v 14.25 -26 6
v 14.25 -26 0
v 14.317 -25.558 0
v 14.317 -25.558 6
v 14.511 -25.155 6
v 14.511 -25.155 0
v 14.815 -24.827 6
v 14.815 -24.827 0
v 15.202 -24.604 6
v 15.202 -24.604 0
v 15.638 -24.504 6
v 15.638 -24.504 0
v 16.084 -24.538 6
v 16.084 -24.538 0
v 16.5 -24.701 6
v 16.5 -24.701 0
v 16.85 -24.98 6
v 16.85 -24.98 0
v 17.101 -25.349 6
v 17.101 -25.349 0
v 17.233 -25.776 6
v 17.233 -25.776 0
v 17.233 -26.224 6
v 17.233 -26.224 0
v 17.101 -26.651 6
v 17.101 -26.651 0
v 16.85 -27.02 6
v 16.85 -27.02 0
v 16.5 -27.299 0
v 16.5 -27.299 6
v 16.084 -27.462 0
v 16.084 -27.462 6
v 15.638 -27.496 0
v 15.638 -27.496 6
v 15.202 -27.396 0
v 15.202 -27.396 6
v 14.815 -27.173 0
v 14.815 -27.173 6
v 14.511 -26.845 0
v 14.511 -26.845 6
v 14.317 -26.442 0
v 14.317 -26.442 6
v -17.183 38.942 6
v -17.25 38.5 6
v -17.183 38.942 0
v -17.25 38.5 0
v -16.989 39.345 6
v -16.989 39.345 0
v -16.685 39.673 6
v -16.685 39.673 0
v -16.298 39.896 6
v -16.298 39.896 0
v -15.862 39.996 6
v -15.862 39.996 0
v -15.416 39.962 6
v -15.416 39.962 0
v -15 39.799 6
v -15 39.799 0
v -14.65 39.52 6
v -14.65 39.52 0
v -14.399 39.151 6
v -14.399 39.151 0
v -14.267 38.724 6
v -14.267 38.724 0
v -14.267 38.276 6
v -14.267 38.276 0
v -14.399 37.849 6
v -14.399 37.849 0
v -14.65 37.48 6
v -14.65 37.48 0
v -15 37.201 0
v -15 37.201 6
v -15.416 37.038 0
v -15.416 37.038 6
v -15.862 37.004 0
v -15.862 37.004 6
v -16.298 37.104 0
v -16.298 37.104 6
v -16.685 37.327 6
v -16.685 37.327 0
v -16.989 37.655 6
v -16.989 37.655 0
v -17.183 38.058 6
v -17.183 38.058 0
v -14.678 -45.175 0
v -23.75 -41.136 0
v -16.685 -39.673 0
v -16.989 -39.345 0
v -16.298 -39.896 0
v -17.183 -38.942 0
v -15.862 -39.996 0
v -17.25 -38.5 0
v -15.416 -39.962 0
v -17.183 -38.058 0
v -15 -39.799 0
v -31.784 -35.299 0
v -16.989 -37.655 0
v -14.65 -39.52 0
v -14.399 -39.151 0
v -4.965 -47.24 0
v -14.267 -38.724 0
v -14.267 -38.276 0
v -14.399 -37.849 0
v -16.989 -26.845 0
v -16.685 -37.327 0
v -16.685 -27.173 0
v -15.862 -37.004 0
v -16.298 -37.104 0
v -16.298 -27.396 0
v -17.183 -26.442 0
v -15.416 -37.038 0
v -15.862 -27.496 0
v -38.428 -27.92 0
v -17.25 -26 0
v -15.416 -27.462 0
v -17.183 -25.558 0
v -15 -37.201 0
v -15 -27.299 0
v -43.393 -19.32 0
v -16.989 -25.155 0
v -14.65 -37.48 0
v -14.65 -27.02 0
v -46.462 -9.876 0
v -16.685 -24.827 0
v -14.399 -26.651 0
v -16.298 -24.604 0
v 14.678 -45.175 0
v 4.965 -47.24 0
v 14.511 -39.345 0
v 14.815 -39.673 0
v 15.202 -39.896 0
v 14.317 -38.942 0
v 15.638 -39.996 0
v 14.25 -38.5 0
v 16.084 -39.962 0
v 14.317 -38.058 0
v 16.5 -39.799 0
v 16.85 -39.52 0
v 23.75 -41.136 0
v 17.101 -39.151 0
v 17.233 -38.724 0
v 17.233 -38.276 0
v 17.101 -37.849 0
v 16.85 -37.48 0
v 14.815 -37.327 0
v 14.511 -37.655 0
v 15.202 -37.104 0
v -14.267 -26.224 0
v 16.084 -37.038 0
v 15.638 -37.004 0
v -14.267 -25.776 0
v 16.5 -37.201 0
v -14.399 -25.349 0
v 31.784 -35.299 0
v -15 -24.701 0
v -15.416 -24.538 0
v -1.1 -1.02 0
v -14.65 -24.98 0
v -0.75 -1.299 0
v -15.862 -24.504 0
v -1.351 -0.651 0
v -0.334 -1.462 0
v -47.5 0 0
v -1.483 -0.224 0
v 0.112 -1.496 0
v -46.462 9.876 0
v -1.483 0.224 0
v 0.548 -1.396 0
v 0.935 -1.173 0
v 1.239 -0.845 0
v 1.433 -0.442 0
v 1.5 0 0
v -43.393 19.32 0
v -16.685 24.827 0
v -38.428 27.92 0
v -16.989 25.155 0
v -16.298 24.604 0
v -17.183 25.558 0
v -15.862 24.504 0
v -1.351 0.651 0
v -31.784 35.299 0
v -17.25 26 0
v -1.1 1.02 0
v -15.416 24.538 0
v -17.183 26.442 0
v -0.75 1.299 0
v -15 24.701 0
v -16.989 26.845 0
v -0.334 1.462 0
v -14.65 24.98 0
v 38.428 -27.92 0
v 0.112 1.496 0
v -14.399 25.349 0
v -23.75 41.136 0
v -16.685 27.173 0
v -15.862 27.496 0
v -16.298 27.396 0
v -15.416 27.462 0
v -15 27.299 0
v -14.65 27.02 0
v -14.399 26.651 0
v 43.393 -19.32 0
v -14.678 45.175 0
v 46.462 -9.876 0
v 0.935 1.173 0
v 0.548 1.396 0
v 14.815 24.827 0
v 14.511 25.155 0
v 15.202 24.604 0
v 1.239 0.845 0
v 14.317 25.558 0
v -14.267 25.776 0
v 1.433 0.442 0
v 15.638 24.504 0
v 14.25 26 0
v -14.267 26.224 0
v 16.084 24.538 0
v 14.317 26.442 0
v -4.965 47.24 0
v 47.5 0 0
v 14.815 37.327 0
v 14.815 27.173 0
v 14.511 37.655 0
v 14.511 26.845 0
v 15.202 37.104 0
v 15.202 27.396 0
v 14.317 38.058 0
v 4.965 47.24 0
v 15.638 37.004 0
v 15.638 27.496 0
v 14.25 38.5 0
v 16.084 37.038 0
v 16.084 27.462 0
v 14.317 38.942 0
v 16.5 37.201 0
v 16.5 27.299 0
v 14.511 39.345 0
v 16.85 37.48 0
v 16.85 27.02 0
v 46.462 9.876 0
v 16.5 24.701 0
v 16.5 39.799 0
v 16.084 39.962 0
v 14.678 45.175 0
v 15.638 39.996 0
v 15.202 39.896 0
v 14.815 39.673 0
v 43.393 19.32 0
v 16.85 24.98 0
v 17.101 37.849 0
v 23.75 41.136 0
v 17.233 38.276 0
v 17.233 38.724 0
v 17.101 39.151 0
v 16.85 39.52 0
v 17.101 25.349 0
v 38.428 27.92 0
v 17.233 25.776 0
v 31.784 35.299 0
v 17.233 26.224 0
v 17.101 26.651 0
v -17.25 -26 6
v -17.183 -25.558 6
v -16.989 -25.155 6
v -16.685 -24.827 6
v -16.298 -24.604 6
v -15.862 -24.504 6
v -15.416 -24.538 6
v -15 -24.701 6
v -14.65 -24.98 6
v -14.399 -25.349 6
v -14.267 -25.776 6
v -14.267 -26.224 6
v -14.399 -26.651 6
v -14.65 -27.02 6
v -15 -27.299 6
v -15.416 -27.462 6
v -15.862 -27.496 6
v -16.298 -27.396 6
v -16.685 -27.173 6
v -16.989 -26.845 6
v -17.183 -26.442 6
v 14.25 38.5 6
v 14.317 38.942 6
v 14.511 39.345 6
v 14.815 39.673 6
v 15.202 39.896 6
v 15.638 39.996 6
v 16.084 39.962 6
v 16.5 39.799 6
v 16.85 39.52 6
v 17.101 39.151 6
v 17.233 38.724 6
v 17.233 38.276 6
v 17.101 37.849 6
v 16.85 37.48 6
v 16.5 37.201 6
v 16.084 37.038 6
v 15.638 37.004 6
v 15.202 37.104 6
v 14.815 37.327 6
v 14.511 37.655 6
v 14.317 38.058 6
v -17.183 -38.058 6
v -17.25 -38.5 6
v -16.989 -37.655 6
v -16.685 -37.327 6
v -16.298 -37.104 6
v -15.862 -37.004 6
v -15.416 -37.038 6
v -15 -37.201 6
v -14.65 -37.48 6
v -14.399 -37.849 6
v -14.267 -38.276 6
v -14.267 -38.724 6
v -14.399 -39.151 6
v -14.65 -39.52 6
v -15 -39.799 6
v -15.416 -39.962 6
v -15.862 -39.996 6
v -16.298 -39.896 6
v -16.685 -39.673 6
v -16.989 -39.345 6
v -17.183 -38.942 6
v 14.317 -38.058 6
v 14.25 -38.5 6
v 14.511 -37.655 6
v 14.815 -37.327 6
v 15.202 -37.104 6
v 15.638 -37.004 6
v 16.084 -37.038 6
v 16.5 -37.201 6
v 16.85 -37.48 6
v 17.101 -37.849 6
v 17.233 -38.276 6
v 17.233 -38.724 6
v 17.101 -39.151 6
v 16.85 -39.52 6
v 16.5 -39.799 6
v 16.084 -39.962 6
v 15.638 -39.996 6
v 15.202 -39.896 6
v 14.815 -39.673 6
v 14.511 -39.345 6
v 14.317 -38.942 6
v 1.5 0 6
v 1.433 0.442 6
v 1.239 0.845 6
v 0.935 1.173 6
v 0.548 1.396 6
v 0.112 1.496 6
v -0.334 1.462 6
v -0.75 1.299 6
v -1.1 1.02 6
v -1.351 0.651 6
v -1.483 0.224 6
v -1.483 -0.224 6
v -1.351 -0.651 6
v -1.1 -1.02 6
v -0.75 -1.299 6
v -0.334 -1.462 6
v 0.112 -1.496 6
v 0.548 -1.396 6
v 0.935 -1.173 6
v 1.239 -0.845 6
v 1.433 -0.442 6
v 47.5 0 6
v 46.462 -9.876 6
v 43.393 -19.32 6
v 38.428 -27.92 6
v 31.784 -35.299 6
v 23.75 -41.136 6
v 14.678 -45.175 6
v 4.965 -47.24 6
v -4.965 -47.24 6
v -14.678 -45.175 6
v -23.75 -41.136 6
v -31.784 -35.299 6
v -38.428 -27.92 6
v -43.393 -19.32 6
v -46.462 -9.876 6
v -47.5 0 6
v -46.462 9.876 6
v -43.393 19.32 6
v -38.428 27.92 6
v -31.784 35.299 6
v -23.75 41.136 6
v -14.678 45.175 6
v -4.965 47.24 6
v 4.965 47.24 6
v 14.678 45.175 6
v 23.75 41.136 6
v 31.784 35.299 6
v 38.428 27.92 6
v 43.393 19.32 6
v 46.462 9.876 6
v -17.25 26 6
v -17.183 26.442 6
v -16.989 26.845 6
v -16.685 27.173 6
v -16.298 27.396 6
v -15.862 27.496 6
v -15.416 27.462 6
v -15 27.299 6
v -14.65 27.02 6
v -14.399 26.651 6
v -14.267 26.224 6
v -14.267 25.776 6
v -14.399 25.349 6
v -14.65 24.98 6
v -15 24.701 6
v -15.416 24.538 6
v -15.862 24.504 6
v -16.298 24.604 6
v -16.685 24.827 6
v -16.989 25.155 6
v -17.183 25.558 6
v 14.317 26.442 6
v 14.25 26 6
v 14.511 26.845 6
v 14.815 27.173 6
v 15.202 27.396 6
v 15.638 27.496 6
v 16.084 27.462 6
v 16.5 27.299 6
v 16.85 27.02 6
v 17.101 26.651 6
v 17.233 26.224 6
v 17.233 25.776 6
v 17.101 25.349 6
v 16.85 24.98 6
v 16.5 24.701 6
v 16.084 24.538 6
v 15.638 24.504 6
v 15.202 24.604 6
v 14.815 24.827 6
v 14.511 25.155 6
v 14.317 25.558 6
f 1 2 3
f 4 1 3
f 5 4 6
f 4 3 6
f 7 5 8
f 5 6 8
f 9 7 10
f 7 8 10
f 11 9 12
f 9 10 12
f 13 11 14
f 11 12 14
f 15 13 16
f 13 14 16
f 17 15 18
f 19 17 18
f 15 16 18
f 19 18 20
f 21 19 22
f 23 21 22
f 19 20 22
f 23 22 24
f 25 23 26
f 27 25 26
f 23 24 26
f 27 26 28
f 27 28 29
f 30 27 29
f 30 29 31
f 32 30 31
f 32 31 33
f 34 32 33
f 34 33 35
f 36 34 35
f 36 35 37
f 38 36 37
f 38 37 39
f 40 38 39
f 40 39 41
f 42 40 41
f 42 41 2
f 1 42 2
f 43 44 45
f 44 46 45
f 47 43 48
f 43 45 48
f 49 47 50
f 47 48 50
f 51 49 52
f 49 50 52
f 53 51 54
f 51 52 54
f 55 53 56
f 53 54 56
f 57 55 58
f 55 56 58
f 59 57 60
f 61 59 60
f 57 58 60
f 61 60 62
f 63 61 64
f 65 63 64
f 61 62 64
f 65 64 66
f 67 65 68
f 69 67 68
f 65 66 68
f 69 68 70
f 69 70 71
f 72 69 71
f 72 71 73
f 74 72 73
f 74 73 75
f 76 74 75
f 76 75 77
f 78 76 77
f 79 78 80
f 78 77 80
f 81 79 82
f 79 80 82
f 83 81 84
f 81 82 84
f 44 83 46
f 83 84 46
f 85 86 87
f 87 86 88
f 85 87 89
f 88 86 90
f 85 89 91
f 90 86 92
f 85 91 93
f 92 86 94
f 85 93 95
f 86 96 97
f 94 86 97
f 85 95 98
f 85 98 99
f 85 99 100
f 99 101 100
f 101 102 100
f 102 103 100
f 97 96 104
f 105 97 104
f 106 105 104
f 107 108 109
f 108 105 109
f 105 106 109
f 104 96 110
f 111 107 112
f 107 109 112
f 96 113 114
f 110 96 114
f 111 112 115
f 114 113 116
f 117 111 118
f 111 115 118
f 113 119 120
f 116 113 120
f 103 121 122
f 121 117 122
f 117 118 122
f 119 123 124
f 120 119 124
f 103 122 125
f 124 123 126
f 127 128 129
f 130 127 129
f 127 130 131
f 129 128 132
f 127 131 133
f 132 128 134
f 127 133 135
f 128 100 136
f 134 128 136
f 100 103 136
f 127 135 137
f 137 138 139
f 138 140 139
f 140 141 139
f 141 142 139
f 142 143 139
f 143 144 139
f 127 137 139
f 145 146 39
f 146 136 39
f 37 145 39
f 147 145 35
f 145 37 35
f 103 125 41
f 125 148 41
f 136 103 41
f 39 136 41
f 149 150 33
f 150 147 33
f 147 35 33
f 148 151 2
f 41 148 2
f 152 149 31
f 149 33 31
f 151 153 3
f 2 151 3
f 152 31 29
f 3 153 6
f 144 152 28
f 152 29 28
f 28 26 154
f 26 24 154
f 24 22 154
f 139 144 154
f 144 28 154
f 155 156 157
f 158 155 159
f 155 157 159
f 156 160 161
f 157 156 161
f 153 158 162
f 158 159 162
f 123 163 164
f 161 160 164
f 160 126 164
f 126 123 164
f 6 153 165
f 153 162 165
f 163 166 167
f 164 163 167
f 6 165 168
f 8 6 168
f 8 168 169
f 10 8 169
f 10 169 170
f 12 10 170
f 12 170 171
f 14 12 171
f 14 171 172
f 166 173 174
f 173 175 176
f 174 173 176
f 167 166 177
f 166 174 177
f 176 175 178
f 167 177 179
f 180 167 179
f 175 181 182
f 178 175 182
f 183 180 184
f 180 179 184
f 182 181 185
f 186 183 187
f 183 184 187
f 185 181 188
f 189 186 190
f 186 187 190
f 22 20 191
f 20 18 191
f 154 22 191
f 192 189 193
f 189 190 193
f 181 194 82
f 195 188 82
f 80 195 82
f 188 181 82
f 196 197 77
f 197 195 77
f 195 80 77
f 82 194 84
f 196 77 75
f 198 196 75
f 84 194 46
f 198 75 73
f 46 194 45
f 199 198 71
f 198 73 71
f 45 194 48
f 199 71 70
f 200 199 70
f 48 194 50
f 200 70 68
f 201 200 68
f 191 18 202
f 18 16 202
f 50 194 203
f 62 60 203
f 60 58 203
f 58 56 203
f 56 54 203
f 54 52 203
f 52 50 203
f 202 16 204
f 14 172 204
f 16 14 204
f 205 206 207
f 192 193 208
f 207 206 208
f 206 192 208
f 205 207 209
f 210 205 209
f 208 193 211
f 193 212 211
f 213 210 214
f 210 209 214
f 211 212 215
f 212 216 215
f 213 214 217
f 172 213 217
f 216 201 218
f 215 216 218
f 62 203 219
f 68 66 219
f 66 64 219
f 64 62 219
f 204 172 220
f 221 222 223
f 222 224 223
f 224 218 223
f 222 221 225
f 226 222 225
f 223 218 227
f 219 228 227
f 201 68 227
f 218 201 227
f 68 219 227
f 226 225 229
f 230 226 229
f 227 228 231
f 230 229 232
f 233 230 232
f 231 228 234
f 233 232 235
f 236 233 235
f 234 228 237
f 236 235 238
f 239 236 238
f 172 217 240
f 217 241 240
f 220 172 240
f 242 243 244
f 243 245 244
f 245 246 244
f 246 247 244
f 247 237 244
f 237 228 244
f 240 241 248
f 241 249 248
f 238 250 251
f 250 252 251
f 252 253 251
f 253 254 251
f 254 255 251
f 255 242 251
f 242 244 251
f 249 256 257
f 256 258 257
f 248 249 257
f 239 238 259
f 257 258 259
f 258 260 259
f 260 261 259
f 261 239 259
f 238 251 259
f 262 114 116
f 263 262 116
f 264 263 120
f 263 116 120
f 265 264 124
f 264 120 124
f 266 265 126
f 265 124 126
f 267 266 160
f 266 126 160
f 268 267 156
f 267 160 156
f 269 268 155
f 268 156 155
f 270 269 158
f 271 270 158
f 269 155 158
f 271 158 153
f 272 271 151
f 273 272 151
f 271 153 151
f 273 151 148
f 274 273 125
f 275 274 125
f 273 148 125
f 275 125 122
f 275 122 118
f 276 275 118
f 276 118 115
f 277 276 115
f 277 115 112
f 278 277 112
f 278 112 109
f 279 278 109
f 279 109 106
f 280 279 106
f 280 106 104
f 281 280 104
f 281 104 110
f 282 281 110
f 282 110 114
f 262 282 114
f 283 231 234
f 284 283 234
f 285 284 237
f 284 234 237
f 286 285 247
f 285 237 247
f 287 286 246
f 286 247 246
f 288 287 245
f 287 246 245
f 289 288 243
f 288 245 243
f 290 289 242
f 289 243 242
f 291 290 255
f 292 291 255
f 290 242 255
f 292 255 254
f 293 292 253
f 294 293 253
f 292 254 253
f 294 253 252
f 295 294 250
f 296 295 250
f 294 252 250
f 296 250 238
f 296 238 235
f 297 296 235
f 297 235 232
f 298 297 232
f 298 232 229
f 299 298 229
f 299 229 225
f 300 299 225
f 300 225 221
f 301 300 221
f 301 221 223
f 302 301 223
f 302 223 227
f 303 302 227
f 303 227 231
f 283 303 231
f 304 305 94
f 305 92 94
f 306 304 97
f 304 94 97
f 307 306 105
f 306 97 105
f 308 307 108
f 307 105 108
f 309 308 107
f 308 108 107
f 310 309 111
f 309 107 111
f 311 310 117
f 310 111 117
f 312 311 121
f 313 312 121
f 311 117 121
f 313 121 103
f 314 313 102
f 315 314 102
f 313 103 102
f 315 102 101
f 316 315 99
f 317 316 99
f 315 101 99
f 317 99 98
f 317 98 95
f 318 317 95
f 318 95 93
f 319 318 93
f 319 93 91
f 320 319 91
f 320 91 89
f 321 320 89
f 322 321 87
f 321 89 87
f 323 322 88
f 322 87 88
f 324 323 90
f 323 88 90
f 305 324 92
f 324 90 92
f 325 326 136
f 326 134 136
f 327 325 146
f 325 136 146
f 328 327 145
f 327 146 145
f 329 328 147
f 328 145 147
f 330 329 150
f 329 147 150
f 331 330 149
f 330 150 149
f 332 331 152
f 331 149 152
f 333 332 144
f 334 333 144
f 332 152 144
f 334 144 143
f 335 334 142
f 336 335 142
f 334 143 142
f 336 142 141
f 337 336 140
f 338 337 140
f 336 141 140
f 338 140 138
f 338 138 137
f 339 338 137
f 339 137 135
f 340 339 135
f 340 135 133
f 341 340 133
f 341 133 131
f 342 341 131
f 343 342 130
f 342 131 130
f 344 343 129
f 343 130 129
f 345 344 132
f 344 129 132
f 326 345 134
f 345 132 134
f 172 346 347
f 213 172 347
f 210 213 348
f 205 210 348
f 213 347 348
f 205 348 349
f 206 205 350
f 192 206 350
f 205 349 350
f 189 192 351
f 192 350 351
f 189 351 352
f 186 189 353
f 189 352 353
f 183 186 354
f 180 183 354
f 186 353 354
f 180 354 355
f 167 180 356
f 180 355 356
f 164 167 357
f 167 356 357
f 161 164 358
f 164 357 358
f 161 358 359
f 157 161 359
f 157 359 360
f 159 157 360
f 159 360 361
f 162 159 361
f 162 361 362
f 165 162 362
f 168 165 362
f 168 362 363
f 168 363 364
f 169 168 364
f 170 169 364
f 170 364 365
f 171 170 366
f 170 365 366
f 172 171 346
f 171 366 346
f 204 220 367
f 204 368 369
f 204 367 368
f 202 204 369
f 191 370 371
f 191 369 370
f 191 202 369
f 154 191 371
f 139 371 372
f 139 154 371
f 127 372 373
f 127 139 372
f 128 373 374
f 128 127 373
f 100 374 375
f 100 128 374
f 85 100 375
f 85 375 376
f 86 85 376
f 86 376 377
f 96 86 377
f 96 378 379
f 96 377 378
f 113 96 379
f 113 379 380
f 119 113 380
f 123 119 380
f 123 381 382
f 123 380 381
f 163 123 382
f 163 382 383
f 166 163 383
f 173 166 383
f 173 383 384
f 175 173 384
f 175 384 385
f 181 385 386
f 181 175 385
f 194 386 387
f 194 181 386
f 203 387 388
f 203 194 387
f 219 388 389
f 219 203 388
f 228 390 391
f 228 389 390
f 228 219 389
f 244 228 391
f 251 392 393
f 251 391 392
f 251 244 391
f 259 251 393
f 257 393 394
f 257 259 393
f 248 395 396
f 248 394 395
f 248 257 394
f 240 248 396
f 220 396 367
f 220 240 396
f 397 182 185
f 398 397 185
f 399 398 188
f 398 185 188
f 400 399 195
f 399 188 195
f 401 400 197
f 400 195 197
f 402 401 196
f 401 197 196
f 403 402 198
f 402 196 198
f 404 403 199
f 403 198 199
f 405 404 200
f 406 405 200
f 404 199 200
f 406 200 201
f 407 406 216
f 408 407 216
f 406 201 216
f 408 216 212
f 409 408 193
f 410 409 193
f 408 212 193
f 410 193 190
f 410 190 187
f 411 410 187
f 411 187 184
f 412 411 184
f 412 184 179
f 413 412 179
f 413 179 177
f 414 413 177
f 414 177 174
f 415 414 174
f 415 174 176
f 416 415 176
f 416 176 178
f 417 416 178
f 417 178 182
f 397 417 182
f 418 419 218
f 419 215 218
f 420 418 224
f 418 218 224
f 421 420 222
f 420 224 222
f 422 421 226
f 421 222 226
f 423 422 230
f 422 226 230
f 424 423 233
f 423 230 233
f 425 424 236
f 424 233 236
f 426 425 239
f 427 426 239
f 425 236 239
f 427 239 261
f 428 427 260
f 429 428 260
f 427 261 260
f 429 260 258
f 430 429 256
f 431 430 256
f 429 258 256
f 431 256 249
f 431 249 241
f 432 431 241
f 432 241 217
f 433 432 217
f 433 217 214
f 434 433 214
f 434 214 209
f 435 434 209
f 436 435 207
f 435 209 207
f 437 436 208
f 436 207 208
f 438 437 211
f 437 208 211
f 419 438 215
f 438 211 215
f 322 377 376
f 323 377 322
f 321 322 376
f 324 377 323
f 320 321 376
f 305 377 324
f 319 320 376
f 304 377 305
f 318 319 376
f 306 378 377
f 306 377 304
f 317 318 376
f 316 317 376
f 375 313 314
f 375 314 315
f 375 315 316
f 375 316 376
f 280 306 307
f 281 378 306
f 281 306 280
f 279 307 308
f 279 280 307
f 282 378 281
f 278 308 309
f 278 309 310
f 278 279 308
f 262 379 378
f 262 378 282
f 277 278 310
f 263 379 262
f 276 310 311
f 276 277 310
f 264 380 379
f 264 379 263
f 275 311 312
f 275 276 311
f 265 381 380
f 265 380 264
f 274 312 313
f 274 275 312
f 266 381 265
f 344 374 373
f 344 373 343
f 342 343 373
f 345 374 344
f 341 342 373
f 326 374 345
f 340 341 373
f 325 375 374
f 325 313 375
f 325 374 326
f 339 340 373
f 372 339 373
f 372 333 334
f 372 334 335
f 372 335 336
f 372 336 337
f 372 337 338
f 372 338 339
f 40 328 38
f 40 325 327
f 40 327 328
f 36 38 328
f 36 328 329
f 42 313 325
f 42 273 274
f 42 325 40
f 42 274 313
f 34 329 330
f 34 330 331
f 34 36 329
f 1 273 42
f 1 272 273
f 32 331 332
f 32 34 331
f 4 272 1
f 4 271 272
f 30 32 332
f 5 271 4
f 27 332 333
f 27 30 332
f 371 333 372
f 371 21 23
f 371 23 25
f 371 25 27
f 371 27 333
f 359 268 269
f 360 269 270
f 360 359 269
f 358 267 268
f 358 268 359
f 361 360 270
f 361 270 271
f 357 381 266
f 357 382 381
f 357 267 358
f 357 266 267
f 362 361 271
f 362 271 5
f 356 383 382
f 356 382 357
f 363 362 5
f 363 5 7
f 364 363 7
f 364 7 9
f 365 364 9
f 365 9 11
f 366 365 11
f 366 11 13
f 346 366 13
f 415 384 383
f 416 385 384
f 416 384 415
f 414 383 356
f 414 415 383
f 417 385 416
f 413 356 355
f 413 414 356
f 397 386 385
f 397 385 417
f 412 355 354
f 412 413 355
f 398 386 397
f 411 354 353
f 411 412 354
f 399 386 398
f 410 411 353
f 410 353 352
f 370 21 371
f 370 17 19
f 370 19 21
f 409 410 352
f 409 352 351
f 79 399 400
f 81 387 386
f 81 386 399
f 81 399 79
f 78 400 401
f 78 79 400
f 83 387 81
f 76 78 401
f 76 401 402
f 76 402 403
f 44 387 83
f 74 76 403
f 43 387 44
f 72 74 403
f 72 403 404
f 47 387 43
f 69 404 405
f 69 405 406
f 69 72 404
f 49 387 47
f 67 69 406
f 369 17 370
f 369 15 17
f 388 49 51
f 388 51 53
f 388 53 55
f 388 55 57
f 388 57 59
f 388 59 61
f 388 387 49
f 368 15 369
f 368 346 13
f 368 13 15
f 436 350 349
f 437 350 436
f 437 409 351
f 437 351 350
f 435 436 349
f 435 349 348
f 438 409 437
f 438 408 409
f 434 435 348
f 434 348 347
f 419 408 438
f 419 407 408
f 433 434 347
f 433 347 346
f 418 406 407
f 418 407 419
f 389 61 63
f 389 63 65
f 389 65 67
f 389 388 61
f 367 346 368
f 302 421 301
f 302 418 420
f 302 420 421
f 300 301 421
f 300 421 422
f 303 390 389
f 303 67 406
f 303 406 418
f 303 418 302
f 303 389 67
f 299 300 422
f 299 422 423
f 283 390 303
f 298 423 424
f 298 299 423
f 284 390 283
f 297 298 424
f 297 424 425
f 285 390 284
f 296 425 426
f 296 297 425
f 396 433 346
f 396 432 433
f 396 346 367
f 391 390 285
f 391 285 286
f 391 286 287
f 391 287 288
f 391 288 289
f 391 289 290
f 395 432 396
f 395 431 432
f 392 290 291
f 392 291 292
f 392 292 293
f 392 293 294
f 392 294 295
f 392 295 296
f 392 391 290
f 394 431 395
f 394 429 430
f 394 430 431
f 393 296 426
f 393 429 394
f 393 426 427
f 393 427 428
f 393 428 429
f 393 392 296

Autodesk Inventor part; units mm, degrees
ref_plane "YZ Plane" through (0, 0, 0) normal (1, 0, 0) x (0, 1, 0)
ref_plane "XZ Plane" through (0, 0, 0) normal (0, 1, 0) x (-1, 0, 0)
ref_plane "XY Plane" through (0, 0, 0) normal (0, 0, 1) x (1, 0, 0)
sketch "Sketch1" plane through (0, 0, 0) normal (0, 0, 1) x (1, 0, 0)
  circle A0 centre (0, 0) radius 47.5
  dimension "d0" = 95
extrude "Extrusion1" add sketch "Sketch1" along normal blind 6
sketch "Sketch12" plane through (0, 0, 0) normal (0, 0, -1) x (-1, 0, 0)
  line L0 (15.75, 36.5709) -> (15.75, -44.8128)
  circle A0 centre (0, 0) radius 47.5 projected
  line L1 (-15.75, 36.5709) -> (-15.75, -44.8128)
  line L2 (-15.75, 36.5709) -> (-15.75, 44.8128)
  line L3 (15.75, 36.5709) -> (15.75, 45.8997)
  line L4 (0, 0) -> (0, 26)
  line L5 (0, 26) -> (0, -26)
  line L6 (0, -26) -> (15.75, -26)
  line L7 (-15.75, -26) -> (0, -26)
  line L8 (0, 26) -> (15.75, 26)
  line L9 (-15.75, 26) -> (0, 26)
  circle A1 centre (-15.75, 26) radius 1.5
  circle A2 centre (15.75, 26) radius 1.5
  circle A3 centre (15.75, -26) radius 1.5
  circle A4 centre (-15.75, -26) radius 1.5
  line L10 (-15.75, 26) -> (-15.75, 38.5)
  line L11 (-15.75, 38.5) -> (15.75, 38.5)
  circle A5 centre (-15.75, 38.5) radius 1.5
  circle A6 centre (15.75, 38.5) radius 1.5
  line L12 (-15.75, -26) -> (-15.75, -38.5)
  line L13 (-15.75, -38.5) -> (15.75, -38.5)
  circle A7 centre (15.75, -38.5) radius 1.5
  circle A8 centre (-15.75, -38.5) radius 1.5
extrude "Extrusion2" cut sketch "Sketch12" against normal blind 10 contours A2 L0 | L0 L8 A2 | A6 L11 L3 | L3 A6 | L0 A2 L8 | L11 A6 L3 | A5 L2 L11 | L11 L2 A5 | A3 L0 | L0 L6 A3 | A1 L1 L9 | L9 L1 A1 | L2 A5 | L0 A3 L6 | L1 A1 | A4 L1 L7 | L7 L1 A4 | L1 A4 | A7 L0 | L0 L13 A7 | A7 L13 L0 | A8 L1 | L1 L13 A8 | A8 L13 L1
sketch "Sketch14" plane through (0, 0, 6) normal (0, 0, 1) x (1, 0, 0)
  point P0 (0, 0)
sketch "Sketch15" plane through (0, 0, 6) normal (0, 0, 1) x (1, 0, 0)
  circle A0 centre (0, 0) radius 1.5
  dimension "d22" = 3
extrude "Extrusion4" cut sketch "Sketch15" against normal blind 10
properties part number "podstawa"
